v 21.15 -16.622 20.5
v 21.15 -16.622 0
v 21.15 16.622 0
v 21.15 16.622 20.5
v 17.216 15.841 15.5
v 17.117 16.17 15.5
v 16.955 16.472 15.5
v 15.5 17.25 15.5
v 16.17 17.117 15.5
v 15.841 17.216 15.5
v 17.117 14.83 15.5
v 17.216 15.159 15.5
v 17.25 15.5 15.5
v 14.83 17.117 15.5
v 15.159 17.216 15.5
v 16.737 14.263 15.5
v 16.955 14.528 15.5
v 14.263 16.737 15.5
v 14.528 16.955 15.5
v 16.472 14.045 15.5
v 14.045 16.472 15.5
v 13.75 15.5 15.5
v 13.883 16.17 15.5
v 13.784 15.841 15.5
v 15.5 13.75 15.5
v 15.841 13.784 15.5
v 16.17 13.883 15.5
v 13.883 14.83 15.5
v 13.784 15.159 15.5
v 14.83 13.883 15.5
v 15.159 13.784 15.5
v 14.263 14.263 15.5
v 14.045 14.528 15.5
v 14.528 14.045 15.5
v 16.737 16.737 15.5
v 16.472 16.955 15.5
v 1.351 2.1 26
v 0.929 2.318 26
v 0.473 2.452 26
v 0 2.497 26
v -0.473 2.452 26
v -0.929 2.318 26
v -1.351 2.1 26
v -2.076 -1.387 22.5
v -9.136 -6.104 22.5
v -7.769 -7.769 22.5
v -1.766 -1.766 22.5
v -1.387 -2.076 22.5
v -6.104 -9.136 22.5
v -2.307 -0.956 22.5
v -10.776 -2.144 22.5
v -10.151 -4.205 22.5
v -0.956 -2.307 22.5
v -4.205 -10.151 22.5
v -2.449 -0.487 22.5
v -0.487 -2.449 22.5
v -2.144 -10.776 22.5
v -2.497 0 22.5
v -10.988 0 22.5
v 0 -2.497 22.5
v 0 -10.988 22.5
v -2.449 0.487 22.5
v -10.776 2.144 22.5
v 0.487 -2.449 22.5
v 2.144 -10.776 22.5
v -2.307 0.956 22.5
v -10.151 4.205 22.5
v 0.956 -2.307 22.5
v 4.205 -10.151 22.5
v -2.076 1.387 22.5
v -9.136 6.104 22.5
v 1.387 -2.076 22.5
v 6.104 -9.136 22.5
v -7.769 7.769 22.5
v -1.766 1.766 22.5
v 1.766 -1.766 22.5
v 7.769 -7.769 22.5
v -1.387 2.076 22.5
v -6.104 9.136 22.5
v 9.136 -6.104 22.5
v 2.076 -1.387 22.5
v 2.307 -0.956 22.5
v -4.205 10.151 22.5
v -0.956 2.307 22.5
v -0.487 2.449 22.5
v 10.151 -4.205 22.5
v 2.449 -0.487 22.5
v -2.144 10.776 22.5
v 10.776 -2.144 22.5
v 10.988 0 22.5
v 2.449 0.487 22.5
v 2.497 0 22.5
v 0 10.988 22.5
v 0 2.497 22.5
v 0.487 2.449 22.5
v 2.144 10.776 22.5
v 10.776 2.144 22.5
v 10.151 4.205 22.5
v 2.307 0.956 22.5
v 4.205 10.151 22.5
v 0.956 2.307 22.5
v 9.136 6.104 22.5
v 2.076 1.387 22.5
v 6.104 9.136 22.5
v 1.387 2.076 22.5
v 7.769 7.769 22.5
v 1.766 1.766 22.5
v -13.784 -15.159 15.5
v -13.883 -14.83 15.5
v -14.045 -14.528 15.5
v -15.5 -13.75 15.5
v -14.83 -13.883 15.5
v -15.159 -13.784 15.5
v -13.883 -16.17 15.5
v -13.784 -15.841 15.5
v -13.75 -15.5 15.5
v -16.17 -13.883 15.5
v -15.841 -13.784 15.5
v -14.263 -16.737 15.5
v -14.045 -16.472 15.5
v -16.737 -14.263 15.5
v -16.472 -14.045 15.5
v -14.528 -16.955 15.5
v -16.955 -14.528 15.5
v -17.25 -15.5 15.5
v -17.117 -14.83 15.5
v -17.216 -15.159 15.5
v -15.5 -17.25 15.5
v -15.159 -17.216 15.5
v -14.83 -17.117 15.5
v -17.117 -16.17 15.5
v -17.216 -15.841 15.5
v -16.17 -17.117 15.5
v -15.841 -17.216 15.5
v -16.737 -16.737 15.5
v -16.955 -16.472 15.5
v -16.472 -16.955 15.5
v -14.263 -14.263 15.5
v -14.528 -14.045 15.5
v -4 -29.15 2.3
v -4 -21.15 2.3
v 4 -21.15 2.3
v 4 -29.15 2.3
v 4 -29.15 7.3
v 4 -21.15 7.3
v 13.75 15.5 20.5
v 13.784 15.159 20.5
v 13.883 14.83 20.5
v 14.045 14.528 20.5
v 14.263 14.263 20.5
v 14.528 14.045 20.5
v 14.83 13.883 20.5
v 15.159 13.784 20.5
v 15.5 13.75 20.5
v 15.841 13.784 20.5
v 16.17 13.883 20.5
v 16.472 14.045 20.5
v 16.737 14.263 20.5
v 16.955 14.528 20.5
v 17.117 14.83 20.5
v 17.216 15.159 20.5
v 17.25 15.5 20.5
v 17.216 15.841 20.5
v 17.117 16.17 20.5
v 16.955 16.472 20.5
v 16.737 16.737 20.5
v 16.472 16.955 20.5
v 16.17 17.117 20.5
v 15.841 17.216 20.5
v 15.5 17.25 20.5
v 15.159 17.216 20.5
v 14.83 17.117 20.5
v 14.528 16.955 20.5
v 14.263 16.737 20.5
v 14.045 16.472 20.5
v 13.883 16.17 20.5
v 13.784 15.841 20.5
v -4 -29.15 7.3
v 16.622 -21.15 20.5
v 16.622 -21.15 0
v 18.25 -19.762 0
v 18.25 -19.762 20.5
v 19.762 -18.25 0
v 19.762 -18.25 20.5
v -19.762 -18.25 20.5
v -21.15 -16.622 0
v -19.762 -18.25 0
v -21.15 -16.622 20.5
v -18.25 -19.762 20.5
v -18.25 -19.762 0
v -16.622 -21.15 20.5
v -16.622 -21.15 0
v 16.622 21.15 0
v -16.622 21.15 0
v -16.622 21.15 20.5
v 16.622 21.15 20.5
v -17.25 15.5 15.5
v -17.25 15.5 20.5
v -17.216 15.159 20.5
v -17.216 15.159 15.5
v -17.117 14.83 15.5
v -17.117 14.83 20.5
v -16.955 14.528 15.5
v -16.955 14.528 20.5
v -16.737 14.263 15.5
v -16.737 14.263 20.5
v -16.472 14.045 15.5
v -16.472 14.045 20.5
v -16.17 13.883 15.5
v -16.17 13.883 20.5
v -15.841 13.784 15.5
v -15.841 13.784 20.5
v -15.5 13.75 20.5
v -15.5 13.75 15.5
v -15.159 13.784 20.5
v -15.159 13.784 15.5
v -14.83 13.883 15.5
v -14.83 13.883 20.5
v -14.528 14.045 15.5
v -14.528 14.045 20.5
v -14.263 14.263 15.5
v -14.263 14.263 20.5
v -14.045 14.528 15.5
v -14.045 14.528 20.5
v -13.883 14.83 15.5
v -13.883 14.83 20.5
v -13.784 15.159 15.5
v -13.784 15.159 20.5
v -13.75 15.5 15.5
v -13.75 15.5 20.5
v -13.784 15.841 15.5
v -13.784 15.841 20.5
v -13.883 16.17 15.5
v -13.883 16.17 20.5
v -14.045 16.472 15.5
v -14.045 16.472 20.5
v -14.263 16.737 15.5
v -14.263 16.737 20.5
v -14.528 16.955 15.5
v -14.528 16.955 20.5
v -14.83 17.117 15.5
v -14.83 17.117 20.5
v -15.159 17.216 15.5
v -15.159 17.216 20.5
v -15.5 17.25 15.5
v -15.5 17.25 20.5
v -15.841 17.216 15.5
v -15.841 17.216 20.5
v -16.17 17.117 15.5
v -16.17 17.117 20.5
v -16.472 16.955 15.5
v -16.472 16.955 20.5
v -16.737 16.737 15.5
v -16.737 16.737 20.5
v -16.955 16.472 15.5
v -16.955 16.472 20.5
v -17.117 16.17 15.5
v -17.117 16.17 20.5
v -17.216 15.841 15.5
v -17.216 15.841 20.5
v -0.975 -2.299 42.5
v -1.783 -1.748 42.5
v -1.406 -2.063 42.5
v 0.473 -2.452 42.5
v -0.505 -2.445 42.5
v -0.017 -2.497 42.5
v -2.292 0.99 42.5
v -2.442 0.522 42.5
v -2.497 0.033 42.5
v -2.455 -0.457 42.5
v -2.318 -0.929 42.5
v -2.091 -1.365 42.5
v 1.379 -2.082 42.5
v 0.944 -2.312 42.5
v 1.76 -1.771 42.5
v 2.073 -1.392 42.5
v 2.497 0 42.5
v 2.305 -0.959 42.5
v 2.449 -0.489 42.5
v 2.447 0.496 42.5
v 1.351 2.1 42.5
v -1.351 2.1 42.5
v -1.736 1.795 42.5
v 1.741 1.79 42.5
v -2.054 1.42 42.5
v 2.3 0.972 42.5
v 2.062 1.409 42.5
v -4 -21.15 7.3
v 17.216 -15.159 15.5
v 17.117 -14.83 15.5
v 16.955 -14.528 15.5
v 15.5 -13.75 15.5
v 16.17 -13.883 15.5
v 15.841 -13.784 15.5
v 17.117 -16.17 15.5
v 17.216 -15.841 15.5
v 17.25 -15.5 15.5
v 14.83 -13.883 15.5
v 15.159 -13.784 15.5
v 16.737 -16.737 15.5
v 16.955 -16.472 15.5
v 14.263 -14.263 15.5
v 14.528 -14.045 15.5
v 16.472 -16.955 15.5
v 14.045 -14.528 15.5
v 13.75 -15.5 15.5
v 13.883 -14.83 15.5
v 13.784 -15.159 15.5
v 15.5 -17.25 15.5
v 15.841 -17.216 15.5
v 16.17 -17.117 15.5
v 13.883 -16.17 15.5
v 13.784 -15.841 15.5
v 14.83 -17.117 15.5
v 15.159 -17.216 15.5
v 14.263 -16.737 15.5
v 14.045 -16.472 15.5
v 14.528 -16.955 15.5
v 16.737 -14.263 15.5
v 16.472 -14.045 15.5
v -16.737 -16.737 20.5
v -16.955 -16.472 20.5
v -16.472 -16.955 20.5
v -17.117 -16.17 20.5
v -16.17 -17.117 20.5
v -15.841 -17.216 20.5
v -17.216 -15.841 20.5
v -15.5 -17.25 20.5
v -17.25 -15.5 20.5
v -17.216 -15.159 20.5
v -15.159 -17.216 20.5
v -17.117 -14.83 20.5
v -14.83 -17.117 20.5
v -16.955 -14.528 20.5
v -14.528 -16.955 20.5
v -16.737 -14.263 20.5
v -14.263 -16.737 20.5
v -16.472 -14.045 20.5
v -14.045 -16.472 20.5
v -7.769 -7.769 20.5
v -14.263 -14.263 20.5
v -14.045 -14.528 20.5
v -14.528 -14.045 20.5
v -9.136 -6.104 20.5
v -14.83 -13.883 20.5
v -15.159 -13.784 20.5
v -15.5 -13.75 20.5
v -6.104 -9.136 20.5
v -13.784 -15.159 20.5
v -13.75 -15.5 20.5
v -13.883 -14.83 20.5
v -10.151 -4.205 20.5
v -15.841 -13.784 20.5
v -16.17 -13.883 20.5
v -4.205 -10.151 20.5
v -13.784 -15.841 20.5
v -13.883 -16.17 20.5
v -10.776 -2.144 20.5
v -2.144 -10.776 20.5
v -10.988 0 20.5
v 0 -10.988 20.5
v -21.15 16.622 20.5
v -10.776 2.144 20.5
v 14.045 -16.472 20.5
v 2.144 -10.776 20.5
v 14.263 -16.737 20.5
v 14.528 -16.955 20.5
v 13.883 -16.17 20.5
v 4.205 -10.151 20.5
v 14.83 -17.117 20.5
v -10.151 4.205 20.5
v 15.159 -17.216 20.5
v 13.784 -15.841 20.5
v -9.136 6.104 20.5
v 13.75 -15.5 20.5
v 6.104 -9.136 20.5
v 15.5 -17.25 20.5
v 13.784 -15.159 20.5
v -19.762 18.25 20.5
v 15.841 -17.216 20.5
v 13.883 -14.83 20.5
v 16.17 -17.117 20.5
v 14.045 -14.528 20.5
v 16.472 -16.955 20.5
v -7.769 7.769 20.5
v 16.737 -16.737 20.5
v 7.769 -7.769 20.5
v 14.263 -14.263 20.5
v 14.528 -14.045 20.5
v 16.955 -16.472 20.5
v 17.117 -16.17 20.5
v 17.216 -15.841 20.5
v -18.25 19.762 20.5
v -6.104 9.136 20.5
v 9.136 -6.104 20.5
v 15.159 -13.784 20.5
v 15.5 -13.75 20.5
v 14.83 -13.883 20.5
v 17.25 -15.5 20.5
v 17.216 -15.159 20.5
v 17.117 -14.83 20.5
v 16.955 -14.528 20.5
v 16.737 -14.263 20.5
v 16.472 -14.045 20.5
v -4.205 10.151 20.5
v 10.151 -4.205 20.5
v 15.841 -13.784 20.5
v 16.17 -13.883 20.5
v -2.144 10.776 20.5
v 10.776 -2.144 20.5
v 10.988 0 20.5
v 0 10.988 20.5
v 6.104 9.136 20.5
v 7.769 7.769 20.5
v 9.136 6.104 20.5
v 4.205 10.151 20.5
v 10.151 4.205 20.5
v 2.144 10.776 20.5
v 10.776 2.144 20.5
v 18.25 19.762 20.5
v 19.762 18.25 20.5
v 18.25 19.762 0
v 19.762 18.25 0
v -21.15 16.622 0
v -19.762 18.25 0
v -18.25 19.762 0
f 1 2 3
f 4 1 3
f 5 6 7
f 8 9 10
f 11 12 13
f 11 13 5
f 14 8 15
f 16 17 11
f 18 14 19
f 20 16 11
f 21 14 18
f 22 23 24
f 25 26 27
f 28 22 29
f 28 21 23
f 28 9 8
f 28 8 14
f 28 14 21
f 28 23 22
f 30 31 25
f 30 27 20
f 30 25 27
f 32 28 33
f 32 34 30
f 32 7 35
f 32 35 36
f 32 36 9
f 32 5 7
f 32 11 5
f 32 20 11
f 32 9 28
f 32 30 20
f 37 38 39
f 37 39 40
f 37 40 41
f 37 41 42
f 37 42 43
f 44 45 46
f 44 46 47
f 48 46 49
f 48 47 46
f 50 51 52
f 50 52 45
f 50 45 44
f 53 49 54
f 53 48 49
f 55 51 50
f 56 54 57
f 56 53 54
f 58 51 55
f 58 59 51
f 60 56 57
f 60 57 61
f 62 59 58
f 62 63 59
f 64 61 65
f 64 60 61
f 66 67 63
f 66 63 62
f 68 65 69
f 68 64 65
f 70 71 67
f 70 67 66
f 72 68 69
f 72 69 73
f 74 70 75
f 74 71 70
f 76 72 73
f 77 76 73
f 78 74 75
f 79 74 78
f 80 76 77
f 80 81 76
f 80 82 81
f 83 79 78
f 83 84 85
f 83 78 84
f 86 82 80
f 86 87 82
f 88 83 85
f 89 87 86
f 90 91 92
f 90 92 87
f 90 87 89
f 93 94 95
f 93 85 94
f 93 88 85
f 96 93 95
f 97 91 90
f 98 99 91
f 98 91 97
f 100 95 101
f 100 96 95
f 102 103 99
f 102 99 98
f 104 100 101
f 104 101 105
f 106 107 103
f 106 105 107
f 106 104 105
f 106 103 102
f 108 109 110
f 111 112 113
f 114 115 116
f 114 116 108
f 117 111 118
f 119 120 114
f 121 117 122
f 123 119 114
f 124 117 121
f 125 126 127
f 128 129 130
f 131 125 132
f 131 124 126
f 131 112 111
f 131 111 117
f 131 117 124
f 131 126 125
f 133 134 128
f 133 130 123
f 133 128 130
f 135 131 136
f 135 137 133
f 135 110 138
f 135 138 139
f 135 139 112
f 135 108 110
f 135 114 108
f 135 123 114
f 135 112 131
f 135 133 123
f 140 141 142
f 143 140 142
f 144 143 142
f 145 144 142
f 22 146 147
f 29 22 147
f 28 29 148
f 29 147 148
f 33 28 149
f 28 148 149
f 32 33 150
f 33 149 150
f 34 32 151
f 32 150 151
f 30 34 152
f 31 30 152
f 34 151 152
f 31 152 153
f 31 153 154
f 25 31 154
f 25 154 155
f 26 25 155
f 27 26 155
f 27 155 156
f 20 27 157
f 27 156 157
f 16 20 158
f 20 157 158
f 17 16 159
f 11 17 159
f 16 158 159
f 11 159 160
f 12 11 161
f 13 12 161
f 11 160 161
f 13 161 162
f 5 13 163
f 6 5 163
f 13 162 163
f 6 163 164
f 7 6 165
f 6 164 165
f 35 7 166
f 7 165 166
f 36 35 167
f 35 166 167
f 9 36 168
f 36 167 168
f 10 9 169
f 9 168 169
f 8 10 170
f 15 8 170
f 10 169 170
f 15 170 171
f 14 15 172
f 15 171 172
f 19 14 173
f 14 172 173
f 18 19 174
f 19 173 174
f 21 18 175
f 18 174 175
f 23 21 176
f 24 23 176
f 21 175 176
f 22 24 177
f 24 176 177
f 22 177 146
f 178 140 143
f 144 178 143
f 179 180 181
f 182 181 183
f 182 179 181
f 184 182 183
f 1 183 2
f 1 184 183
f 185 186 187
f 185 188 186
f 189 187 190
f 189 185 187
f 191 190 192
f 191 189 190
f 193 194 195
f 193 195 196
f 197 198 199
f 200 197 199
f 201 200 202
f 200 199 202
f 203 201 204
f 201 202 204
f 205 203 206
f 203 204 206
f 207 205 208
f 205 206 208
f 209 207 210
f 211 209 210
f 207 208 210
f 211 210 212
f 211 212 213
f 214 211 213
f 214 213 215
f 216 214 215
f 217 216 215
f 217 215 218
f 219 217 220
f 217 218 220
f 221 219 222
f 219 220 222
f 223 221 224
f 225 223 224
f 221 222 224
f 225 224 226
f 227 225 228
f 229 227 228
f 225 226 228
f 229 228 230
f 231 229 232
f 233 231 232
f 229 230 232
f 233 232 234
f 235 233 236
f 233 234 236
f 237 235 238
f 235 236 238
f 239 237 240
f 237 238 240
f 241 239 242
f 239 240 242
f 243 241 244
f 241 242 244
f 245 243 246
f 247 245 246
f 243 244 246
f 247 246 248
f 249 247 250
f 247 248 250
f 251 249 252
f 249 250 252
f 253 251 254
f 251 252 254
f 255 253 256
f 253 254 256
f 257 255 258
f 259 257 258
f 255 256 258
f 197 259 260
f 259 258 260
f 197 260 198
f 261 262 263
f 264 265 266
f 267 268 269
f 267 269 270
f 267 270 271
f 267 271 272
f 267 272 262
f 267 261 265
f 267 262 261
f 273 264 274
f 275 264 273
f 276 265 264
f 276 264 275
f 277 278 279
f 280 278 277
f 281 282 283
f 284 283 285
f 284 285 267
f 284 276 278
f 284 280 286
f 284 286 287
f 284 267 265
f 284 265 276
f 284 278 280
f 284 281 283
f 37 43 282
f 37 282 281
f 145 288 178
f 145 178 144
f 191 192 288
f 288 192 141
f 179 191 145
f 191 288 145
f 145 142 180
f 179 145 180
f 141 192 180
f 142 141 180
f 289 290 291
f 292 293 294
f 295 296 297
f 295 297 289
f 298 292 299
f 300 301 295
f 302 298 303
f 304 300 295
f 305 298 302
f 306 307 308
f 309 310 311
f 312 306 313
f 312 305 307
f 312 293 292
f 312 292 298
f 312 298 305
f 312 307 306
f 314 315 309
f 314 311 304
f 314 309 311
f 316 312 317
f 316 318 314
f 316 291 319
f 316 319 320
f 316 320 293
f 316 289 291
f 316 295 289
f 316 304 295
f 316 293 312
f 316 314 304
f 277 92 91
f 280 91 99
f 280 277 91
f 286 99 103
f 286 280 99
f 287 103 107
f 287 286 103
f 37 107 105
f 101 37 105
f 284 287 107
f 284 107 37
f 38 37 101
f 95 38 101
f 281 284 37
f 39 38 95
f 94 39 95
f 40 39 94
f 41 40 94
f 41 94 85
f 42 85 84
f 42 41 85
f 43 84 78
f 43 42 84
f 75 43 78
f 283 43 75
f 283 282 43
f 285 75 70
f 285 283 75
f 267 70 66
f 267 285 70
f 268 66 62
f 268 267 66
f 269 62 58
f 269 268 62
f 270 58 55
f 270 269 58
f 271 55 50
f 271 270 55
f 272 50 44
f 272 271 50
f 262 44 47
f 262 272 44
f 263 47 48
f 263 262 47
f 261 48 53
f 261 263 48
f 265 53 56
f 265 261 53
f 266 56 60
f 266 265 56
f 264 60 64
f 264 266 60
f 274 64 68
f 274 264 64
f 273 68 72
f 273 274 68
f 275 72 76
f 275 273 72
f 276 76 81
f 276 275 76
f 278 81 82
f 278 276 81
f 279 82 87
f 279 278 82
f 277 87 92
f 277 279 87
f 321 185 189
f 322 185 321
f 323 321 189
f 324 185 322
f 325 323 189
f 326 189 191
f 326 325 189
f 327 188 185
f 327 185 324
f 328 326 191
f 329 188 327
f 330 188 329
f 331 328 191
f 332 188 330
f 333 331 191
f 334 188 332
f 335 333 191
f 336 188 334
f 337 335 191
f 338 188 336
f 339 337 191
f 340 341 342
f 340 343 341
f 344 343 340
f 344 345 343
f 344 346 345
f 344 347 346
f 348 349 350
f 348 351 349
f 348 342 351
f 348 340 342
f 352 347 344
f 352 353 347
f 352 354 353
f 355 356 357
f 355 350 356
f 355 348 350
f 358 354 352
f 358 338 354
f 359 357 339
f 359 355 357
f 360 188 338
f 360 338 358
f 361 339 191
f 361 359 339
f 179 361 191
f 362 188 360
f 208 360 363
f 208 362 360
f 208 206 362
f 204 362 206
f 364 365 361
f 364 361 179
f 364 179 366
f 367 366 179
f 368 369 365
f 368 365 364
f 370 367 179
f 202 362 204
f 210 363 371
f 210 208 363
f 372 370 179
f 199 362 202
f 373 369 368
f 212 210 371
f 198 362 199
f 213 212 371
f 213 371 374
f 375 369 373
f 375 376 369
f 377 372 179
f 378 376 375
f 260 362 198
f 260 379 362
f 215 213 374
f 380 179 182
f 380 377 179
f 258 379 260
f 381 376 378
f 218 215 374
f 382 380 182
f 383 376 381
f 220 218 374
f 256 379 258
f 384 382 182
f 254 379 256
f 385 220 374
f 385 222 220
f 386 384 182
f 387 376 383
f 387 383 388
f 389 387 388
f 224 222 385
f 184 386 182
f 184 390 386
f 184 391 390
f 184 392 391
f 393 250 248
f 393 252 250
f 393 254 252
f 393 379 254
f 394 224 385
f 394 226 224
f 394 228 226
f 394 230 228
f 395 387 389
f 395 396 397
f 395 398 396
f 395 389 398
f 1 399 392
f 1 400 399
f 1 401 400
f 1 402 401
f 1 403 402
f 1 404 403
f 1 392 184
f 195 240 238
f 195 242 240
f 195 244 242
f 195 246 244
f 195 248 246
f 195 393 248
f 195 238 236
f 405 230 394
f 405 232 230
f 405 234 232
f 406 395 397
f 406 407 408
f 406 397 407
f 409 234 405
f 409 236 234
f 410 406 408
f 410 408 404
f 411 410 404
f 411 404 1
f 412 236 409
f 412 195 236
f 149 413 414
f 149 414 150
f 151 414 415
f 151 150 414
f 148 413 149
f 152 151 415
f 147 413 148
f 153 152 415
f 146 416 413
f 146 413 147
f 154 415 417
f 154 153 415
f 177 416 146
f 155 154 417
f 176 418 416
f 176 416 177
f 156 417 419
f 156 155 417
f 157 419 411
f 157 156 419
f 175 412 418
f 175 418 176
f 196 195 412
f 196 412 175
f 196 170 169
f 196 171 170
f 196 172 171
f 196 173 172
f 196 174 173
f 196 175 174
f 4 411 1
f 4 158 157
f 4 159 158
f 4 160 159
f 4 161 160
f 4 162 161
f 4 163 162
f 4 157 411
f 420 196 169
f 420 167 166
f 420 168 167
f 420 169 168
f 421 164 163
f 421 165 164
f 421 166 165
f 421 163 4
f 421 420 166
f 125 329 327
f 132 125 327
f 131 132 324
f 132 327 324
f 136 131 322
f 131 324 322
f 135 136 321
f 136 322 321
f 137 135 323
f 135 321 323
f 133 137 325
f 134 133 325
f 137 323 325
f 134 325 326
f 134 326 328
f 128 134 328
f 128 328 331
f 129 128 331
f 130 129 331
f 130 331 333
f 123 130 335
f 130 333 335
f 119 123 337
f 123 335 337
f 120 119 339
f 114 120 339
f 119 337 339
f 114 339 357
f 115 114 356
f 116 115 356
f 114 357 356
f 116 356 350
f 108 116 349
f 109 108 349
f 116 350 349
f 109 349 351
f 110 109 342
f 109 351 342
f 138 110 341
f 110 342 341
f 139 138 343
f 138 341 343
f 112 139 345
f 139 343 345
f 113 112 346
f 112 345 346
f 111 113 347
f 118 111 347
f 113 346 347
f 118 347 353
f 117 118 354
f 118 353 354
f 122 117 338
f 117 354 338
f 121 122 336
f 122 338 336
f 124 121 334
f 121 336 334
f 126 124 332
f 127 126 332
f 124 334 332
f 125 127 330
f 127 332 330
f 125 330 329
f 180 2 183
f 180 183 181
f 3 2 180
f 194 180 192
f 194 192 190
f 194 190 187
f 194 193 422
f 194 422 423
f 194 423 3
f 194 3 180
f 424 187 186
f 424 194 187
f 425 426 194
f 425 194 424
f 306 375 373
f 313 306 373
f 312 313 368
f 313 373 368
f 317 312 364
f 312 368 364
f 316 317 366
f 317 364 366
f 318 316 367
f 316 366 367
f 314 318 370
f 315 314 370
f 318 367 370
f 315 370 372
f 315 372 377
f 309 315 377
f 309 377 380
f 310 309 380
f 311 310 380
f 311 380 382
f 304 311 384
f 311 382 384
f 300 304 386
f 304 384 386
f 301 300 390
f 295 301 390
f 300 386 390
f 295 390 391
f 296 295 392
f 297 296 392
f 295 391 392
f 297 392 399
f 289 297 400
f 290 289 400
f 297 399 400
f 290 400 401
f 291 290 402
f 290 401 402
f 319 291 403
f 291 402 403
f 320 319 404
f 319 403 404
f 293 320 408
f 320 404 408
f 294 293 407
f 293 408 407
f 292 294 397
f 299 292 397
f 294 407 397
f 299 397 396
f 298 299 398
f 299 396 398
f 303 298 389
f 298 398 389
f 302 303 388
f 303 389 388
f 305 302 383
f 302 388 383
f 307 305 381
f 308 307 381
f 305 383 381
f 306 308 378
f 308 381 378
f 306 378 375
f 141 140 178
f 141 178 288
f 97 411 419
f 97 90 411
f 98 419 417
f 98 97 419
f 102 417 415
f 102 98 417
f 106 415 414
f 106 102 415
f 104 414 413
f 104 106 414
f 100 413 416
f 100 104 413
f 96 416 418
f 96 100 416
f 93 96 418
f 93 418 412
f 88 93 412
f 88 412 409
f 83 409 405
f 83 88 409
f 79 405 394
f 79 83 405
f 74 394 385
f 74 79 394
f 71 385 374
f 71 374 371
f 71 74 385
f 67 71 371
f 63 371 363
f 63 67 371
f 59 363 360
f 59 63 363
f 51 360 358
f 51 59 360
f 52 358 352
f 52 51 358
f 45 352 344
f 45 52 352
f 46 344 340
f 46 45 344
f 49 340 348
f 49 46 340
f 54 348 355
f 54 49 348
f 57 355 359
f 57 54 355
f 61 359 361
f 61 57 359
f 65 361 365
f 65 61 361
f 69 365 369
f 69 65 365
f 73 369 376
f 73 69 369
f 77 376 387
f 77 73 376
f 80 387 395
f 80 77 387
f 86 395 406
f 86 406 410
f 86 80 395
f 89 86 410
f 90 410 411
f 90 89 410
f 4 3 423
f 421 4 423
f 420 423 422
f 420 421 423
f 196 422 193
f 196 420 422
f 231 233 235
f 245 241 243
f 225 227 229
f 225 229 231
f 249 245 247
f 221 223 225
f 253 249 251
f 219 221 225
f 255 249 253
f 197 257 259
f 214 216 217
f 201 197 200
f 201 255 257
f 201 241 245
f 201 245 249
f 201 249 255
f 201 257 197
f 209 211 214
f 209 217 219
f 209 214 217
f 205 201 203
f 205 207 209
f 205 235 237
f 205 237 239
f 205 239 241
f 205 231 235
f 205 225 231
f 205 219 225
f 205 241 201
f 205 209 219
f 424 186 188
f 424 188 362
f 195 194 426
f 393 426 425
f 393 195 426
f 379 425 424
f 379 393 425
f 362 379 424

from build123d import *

# Parameters (mm, degrees)
SKETCH001_W          = 5
SKETCH001_H          = 1
POCKET_DEPTH         = 16.5
SKETCH002_R          = 55
SKETCH002_W          = 42.3
SKETCH002_H          = 42.3
POCKET001_DEPTH      = 0.001
POCKET001_DEPTH_BACK = -42.501
SKETCH003_R          = 1.75
POCKET002_DEPTH      = 5
SKETCH004_W          = 8
SKETCH004_H          = 8
PAD_DEPTH            = 5


with BuildPart() as part:
    # Sketch → Revolution (revolve)
    with BuildSketch(Plane.XZ):
        Polygon((0, 0), (26.9, 0), (26.9, 20.5), (10.9875, 20.5), (10.9875, 22.5), (2.497, 22.5), (2.497, 42.5), (0, 42.5), align=None)
    revolve(axis=Axis((0, 0, 0), (0, 0, 1)))

    # Sketch001 → Pocket (cut)
    with BuildSketch(Plane.XY.offset(42.5)):
        with Locations((0, 2.6)):
            Rectangle(SKETCH001_W, SKETCH001_H)
    extrude(amount=-POCKET_DEPTH, mode=Mode.SUBTRACT)

    # Sketch002 → Pocket001 (cut, two sides)
    with BuildSketch(Plane.XY) as pocket001_sk:
        Circle(SKETCH002_R)
        Rectangle(SKETCH002_W, SKETCH002_H, mode=Mode.SUBTRACT)
    extrude(amount=-POCKET001_DEPTH, mode=Mode.SUBTRACT)
    extrude(pocket001_sk.sketch, amount=-POCKET001_DEPTH_BACK, mode=Mode.SUBTRACT)

    # Sketch003 (on Face10 of Pocket001) → Pocket002 (cut)
    with BuildSketch(Plane(origin=(0, 0, 20.5), x_dir=(-1, 0, 0), z_dir=(0, 0, 1))):
        with Locations((-15.5, 15.5)):
            Circle(SKETCH003_R)
        with Locations((15.5, 15.5)):
            Circle(SKETCH003_R)
        with Locations((15.5, -15.5)):
            Circle(SKETCH003_R)
        with Locations((-15.5, -15.5)):
            Circle(SKETCH003_R)
    extrude(amount=-POCKET002_DEPTH, mode=Mode.SUBTRACT)

    # Sketch004 → Pad (join)
    with BuildSketch(Plane.XY.offset(2.3)):
        with Locations((0, -25.15)):
            Rectangle(SKETCH004_W, SKETCH004_H)
    extrude(amount=PAD_DEPTH)


solid = part.part
